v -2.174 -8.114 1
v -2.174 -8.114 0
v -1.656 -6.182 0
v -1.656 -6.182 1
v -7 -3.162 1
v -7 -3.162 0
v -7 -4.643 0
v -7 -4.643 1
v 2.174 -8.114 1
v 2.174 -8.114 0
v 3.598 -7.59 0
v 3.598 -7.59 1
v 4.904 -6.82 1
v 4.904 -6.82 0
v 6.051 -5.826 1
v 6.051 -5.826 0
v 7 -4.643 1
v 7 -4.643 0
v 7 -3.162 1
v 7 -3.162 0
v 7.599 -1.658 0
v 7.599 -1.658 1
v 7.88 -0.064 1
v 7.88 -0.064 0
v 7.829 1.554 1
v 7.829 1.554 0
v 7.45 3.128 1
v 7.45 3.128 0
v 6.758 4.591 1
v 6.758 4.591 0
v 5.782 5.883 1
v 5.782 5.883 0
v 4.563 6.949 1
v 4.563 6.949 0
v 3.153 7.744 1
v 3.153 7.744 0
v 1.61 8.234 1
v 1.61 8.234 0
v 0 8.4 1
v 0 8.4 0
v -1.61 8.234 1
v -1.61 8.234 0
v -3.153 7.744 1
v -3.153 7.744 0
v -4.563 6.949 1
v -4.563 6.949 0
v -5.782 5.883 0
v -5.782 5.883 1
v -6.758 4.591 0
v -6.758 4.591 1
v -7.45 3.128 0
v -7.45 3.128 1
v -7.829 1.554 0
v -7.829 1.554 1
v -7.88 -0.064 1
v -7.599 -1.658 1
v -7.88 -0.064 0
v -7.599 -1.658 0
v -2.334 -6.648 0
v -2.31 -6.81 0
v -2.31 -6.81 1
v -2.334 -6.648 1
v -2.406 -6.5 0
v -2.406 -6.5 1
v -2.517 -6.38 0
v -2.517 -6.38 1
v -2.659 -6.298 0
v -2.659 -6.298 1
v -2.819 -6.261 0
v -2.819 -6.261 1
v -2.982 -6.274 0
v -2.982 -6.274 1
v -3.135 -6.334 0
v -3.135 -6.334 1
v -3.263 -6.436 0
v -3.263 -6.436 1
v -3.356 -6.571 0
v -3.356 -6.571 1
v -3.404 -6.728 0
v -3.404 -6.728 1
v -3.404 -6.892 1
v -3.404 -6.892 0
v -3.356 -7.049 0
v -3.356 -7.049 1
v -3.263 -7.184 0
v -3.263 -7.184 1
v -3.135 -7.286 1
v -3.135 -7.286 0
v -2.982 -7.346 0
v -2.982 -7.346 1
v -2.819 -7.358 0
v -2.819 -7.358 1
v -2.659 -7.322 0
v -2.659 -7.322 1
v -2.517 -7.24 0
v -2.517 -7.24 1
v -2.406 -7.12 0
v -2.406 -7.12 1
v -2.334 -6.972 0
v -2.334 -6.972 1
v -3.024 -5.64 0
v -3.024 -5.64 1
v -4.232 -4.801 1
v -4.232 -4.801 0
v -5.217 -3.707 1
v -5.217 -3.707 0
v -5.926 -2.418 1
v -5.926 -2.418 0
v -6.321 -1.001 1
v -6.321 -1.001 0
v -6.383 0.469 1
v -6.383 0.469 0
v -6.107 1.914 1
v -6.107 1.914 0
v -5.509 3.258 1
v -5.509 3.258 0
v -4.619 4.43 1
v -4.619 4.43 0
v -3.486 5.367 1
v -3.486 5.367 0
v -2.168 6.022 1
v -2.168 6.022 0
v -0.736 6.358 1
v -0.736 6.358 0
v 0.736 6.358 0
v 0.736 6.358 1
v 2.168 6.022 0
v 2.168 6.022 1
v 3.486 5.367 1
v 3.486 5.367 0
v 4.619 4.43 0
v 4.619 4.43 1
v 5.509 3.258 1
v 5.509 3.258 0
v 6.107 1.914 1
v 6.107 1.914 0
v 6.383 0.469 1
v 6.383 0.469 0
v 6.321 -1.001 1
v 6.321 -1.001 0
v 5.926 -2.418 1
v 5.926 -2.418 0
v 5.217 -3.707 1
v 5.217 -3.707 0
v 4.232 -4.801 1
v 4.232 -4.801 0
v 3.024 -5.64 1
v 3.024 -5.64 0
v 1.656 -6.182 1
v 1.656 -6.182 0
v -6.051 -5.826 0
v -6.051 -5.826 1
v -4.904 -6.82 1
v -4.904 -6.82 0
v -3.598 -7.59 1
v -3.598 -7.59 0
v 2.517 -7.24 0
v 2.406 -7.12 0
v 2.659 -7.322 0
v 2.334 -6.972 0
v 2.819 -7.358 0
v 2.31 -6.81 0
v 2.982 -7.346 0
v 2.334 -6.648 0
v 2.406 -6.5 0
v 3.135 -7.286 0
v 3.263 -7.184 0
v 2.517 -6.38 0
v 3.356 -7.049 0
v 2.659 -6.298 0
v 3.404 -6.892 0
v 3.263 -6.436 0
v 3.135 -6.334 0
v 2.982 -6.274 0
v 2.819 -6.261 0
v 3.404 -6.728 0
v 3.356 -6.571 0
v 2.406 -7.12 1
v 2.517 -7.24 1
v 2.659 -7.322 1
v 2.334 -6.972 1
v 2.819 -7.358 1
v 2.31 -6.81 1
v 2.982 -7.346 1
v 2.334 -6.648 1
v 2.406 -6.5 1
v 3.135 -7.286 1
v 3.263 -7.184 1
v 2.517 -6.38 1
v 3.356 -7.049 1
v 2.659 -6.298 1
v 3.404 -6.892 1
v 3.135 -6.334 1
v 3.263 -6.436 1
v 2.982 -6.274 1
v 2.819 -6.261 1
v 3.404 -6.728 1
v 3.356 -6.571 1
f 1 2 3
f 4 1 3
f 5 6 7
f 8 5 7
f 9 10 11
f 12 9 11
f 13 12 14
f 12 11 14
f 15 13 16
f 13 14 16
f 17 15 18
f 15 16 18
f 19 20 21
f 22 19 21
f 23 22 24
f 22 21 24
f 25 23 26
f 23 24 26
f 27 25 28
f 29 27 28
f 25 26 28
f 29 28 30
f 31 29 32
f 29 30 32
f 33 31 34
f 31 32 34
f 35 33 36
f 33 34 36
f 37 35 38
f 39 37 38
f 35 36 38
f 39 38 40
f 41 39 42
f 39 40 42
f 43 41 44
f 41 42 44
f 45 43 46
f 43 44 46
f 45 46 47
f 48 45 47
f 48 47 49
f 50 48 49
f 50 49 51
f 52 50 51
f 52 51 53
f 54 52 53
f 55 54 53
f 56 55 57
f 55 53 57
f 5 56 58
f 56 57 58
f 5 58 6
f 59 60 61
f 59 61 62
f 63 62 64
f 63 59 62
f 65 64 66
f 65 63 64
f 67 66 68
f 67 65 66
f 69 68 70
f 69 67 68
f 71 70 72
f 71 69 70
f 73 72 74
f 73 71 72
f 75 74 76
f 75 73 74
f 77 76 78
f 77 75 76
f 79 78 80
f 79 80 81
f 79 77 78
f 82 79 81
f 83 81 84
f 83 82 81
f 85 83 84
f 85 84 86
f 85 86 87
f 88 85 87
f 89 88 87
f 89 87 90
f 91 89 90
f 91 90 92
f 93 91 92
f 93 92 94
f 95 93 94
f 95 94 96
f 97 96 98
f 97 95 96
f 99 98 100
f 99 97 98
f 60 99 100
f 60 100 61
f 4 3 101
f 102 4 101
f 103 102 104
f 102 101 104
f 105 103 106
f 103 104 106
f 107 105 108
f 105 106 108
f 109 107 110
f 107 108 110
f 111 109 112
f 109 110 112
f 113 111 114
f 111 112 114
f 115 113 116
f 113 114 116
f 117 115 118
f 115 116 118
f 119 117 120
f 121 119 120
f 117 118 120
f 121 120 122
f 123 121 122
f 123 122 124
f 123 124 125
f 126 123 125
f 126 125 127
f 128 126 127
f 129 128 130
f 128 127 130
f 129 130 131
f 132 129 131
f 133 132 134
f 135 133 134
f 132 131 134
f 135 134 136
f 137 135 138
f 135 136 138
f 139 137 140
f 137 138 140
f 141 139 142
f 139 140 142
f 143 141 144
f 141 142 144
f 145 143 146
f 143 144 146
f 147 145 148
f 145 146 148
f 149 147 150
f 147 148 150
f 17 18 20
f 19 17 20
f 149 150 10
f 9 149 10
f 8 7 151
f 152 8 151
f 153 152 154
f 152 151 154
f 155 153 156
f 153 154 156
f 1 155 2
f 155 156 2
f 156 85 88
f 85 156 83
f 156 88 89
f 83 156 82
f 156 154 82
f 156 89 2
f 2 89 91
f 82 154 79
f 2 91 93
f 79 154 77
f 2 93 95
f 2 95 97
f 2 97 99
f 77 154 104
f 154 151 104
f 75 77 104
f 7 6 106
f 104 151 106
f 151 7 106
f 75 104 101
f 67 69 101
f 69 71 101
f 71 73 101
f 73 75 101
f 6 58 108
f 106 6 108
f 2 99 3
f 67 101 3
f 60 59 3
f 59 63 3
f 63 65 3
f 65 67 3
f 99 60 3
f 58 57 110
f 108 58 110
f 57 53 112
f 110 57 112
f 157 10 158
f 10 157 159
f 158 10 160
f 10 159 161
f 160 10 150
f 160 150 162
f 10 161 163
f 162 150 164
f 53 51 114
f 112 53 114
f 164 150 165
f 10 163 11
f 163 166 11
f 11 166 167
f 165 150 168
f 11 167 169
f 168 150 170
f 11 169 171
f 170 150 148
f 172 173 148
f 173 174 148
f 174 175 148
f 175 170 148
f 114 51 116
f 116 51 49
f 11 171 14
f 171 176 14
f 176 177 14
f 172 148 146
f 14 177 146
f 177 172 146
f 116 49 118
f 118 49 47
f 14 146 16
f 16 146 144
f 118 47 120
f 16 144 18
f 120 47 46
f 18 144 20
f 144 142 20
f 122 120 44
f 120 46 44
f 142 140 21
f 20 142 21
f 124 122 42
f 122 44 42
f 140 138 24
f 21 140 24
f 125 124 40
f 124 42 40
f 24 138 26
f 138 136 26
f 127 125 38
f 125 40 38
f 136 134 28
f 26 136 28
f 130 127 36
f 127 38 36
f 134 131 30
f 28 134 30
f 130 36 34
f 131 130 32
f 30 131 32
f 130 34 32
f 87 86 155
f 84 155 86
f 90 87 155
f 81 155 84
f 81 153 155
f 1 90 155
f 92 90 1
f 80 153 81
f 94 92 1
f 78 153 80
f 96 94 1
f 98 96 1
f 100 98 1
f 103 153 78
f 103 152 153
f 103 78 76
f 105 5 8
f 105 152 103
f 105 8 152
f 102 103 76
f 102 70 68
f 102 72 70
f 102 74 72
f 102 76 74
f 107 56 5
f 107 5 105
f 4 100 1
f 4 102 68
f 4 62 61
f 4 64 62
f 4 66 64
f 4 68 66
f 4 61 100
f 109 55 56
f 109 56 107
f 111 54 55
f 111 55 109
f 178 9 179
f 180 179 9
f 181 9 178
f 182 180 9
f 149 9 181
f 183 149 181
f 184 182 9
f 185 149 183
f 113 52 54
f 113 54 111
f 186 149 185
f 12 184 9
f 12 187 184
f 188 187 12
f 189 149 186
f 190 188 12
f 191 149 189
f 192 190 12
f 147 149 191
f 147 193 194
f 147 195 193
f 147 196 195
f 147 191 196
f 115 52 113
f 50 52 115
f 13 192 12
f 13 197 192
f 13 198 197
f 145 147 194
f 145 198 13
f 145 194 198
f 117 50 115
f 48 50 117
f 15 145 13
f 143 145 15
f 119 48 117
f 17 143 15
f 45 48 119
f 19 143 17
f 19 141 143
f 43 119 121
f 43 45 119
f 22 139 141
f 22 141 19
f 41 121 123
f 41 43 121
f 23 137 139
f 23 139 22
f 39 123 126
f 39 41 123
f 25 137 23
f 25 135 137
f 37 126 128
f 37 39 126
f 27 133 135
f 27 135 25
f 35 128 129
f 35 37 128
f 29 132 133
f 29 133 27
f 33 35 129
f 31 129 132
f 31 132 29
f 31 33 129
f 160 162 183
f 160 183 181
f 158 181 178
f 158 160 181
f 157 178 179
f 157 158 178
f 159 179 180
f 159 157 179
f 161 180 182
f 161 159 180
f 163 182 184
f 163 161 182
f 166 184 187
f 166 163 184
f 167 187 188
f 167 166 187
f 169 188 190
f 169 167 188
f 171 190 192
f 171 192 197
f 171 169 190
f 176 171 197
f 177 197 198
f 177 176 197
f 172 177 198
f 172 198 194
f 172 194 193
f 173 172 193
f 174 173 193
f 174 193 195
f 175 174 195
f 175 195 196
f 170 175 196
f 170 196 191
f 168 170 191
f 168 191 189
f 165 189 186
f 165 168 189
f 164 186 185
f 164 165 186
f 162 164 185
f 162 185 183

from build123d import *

# Parameters (mm, degrees)
SKETCH1_R      = 0.55
EXTRUDE1_DEPTH = 1


with BuildPart() as part:
    # Sketch1 → Extrude1 (new body)
    with BuildSketch(Plane.XY):
        with BuildLine():
            Line((1.656441889, -6.181925288), (2.174079979, -8.113776941))
            ThreePointArc((2.174079979, -8.113776941), (4.904287135, -6.819675043), (7, -4.643274706))
            Line((7, -4.643274706), (7, -3.161966685))
            ThreePointArc((7, -3.161966685), (0, 8.4), (-7, -3.161966685))
            Line((-7, -3.161966685), (-7, -4.643274706))
            ThreePointArc((-7, -4.643274706), (-4.904287135, -6.819675043), (-2.174079979, -8.113776941))
            Line((-2.174079979, -8.113776941), (-1.656441889, -6.181925288))
            ThreePointArc((-1.656441889, -6.181925288), (0, 6.4), (1.656441889, -6.181925288))
        make_face()
        with Locations((-2.86, -6.809962004)):
            Circle(SKETCH1_R, mode=Mode.SUBTRACT)
        with Locations(Location((2.86, -6.809962004, 0), (0, 0, 180))):
            Circle(SKETCH1_R, mode=Mode.SUBTRACT)
    extrude(amount=EXTRUDE1_DEPTH)


solid = part.part
